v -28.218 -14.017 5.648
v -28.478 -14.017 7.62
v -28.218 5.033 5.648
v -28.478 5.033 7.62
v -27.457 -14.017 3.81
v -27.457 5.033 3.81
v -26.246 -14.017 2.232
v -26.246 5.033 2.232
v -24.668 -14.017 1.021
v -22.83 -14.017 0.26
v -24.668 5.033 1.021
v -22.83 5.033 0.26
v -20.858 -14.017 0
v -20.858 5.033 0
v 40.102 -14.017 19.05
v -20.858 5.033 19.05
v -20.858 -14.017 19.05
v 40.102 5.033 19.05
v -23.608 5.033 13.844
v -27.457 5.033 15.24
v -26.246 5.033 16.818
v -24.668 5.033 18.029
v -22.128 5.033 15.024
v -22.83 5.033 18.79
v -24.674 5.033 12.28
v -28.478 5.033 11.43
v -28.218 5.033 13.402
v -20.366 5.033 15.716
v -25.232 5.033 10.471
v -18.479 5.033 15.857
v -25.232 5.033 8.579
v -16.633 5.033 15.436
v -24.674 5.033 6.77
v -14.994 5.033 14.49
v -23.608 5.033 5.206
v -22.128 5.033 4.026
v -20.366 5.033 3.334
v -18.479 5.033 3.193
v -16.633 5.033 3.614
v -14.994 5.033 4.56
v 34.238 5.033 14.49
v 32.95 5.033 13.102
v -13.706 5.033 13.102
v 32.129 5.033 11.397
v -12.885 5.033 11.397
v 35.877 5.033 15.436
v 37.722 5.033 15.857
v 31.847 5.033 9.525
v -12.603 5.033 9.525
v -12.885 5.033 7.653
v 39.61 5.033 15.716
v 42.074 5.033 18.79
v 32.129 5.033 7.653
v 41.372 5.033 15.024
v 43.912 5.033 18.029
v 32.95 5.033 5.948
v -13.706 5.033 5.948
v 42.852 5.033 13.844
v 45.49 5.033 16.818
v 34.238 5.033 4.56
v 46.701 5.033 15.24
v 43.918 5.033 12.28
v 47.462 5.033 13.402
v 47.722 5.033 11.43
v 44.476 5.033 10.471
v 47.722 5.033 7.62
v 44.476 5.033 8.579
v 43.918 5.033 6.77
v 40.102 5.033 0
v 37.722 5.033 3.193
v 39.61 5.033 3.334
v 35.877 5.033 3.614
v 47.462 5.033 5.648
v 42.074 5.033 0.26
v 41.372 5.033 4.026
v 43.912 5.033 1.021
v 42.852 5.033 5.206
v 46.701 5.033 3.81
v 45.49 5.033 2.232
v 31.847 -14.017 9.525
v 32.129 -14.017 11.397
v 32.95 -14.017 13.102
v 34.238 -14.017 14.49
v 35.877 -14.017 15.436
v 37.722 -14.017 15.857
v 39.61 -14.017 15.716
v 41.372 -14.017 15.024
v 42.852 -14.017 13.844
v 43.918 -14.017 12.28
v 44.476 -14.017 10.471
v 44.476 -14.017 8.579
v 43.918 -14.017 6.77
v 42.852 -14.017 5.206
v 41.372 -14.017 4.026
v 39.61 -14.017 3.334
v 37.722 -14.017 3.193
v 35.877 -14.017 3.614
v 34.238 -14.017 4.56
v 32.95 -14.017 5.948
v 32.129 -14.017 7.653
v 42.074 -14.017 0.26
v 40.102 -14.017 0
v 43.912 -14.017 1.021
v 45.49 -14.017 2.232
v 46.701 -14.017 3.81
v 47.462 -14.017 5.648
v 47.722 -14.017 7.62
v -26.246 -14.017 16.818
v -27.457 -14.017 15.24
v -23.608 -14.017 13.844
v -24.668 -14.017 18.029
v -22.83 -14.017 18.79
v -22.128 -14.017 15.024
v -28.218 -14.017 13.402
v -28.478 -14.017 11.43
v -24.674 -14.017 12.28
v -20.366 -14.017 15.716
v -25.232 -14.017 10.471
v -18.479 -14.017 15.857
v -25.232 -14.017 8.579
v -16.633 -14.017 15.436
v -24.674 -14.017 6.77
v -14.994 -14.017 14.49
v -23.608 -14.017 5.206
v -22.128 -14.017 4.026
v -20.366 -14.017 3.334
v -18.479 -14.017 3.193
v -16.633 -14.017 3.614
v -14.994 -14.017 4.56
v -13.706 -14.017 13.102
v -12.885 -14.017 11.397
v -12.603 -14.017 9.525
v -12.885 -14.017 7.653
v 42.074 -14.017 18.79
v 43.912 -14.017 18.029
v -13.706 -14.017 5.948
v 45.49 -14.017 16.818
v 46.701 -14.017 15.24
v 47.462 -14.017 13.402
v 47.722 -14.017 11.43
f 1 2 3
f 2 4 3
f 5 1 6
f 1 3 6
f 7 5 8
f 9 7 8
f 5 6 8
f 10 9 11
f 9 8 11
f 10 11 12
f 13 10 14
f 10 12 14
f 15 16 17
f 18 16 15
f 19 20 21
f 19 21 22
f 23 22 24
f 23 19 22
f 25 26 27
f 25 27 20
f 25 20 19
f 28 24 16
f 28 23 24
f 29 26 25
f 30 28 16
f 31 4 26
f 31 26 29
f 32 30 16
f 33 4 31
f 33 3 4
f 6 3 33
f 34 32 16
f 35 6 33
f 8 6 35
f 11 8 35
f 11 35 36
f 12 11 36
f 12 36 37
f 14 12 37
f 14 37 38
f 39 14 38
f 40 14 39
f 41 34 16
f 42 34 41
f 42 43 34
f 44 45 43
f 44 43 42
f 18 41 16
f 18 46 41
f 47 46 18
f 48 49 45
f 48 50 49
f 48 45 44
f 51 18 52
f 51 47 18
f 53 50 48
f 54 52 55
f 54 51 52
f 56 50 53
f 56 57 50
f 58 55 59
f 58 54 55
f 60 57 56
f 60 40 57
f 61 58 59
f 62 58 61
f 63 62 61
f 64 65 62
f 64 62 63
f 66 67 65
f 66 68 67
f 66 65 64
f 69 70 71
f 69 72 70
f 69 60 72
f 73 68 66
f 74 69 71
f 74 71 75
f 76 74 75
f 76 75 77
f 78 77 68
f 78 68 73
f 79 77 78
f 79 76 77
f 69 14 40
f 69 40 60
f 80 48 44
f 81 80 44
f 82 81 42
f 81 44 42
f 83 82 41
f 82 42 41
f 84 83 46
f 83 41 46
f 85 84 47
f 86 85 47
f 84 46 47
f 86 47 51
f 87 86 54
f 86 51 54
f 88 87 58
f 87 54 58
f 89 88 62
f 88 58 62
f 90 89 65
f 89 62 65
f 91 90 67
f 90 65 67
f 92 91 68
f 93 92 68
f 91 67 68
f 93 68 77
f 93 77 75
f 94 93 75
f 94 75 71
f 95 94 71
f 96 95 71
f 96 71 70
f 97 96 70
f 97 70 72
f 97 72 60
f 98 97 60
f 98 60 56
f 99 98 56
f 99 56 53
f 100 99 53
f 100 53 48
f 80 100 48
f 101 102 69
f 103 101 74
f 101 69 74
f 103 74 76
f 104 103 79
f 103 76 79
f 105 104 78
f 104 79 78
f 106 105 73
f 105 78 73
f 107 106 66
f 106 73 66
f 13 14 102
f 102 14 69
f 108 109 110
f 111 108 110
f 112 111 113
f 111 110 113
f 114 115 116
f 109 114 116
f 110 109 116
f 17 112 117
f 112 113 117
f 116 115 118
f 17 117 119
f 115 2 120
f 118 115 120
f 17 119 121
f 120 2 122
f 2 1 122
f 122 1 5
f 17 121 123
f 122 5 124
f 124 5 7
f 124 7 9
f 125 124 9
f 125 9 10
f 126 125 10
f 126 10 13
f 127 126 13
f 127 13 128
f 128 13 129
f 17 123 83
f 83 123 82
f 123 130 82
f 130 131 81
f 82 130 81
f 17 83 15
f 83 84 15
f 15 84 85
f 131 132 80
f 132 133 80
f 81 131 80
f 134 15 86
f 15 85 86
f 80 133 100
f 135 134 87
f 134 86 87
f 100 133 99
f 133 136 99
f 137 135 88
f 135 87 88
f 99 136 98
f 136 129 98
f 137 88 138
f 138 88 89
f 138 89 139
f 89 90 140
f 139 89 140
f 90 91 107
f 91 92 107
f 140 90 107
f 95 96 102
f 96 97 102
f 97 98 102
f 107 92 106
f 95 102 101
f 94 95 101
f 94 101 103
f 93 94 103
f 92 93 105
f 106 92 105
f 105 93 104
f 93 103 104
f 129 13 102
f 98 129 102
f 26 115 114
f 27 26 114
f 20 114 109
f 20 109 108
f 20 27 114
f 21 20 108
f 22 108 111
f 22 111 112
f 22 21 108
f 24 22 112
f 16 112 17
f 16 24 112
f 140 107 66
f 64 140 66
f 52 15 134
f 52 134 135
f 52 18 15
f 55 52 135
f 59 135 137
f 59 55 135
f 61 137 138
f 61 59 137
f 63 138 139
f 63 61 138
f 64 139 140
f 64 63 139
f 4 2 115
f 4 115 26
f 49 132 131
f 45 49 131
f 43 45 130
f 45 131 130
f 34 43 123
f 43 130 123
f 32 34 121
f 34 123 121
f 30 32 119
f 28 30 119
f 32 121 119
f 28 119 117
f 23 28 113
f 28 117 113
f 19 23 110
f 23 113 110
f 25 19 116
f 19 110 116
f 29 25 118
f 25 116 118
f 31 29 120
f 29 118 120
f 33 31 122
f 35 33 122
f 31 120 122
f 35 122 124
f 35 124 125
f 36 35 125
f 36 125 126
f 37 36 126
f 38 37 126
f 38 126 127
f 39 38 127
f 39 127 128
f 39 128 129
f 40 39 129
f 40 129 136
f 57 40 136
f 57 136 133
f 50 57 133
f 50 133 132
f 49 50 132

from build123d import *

# Parameters (mm, degrees)
F0_W     = 76.2
F0_H     = 19.05
F1_DEPTH = 19.05
F3_D     = 12.7
F5_D     = 12.7
F6_R     = 7.62


with BuildPart() as f1:
    # F0 (on Top) → F1 (new body)
    with BuildSketch(Plane.XY):
        with Locations((9.621889, -4.491718)):
            Rectangle(F0_W, F0_H)
    extrude(amount=F1_DEPTH)

    # F3 (through all)
    with Locations(Plane(origin=(0, 5.033282, 0), x_dir=(-1, 0, 0), z_dir=(0, 1, 0))):
        with Locations((18.953111, 9.525)):
            Hole(F3_D / 2)

    # F5 (through all)
    with Locations(Plane.XZ.offset(14.016718)):
        with Locations((38.196889, 9.525)):
            Hole(F5_D / 2)

    # F6
    f6_edges = [f1.edges().sort_by_distance(p)[0] for p in [
        (47.721889, -4.491718, 19.05),
        (47.721889, -4.491718, 0),
        (-28.478111, -4.491718, 19.05),
        (-28.478111, -4.491718, 0),
    ]]
    fillet(f6_edges, radius=F6_R)


solid = f1.part
